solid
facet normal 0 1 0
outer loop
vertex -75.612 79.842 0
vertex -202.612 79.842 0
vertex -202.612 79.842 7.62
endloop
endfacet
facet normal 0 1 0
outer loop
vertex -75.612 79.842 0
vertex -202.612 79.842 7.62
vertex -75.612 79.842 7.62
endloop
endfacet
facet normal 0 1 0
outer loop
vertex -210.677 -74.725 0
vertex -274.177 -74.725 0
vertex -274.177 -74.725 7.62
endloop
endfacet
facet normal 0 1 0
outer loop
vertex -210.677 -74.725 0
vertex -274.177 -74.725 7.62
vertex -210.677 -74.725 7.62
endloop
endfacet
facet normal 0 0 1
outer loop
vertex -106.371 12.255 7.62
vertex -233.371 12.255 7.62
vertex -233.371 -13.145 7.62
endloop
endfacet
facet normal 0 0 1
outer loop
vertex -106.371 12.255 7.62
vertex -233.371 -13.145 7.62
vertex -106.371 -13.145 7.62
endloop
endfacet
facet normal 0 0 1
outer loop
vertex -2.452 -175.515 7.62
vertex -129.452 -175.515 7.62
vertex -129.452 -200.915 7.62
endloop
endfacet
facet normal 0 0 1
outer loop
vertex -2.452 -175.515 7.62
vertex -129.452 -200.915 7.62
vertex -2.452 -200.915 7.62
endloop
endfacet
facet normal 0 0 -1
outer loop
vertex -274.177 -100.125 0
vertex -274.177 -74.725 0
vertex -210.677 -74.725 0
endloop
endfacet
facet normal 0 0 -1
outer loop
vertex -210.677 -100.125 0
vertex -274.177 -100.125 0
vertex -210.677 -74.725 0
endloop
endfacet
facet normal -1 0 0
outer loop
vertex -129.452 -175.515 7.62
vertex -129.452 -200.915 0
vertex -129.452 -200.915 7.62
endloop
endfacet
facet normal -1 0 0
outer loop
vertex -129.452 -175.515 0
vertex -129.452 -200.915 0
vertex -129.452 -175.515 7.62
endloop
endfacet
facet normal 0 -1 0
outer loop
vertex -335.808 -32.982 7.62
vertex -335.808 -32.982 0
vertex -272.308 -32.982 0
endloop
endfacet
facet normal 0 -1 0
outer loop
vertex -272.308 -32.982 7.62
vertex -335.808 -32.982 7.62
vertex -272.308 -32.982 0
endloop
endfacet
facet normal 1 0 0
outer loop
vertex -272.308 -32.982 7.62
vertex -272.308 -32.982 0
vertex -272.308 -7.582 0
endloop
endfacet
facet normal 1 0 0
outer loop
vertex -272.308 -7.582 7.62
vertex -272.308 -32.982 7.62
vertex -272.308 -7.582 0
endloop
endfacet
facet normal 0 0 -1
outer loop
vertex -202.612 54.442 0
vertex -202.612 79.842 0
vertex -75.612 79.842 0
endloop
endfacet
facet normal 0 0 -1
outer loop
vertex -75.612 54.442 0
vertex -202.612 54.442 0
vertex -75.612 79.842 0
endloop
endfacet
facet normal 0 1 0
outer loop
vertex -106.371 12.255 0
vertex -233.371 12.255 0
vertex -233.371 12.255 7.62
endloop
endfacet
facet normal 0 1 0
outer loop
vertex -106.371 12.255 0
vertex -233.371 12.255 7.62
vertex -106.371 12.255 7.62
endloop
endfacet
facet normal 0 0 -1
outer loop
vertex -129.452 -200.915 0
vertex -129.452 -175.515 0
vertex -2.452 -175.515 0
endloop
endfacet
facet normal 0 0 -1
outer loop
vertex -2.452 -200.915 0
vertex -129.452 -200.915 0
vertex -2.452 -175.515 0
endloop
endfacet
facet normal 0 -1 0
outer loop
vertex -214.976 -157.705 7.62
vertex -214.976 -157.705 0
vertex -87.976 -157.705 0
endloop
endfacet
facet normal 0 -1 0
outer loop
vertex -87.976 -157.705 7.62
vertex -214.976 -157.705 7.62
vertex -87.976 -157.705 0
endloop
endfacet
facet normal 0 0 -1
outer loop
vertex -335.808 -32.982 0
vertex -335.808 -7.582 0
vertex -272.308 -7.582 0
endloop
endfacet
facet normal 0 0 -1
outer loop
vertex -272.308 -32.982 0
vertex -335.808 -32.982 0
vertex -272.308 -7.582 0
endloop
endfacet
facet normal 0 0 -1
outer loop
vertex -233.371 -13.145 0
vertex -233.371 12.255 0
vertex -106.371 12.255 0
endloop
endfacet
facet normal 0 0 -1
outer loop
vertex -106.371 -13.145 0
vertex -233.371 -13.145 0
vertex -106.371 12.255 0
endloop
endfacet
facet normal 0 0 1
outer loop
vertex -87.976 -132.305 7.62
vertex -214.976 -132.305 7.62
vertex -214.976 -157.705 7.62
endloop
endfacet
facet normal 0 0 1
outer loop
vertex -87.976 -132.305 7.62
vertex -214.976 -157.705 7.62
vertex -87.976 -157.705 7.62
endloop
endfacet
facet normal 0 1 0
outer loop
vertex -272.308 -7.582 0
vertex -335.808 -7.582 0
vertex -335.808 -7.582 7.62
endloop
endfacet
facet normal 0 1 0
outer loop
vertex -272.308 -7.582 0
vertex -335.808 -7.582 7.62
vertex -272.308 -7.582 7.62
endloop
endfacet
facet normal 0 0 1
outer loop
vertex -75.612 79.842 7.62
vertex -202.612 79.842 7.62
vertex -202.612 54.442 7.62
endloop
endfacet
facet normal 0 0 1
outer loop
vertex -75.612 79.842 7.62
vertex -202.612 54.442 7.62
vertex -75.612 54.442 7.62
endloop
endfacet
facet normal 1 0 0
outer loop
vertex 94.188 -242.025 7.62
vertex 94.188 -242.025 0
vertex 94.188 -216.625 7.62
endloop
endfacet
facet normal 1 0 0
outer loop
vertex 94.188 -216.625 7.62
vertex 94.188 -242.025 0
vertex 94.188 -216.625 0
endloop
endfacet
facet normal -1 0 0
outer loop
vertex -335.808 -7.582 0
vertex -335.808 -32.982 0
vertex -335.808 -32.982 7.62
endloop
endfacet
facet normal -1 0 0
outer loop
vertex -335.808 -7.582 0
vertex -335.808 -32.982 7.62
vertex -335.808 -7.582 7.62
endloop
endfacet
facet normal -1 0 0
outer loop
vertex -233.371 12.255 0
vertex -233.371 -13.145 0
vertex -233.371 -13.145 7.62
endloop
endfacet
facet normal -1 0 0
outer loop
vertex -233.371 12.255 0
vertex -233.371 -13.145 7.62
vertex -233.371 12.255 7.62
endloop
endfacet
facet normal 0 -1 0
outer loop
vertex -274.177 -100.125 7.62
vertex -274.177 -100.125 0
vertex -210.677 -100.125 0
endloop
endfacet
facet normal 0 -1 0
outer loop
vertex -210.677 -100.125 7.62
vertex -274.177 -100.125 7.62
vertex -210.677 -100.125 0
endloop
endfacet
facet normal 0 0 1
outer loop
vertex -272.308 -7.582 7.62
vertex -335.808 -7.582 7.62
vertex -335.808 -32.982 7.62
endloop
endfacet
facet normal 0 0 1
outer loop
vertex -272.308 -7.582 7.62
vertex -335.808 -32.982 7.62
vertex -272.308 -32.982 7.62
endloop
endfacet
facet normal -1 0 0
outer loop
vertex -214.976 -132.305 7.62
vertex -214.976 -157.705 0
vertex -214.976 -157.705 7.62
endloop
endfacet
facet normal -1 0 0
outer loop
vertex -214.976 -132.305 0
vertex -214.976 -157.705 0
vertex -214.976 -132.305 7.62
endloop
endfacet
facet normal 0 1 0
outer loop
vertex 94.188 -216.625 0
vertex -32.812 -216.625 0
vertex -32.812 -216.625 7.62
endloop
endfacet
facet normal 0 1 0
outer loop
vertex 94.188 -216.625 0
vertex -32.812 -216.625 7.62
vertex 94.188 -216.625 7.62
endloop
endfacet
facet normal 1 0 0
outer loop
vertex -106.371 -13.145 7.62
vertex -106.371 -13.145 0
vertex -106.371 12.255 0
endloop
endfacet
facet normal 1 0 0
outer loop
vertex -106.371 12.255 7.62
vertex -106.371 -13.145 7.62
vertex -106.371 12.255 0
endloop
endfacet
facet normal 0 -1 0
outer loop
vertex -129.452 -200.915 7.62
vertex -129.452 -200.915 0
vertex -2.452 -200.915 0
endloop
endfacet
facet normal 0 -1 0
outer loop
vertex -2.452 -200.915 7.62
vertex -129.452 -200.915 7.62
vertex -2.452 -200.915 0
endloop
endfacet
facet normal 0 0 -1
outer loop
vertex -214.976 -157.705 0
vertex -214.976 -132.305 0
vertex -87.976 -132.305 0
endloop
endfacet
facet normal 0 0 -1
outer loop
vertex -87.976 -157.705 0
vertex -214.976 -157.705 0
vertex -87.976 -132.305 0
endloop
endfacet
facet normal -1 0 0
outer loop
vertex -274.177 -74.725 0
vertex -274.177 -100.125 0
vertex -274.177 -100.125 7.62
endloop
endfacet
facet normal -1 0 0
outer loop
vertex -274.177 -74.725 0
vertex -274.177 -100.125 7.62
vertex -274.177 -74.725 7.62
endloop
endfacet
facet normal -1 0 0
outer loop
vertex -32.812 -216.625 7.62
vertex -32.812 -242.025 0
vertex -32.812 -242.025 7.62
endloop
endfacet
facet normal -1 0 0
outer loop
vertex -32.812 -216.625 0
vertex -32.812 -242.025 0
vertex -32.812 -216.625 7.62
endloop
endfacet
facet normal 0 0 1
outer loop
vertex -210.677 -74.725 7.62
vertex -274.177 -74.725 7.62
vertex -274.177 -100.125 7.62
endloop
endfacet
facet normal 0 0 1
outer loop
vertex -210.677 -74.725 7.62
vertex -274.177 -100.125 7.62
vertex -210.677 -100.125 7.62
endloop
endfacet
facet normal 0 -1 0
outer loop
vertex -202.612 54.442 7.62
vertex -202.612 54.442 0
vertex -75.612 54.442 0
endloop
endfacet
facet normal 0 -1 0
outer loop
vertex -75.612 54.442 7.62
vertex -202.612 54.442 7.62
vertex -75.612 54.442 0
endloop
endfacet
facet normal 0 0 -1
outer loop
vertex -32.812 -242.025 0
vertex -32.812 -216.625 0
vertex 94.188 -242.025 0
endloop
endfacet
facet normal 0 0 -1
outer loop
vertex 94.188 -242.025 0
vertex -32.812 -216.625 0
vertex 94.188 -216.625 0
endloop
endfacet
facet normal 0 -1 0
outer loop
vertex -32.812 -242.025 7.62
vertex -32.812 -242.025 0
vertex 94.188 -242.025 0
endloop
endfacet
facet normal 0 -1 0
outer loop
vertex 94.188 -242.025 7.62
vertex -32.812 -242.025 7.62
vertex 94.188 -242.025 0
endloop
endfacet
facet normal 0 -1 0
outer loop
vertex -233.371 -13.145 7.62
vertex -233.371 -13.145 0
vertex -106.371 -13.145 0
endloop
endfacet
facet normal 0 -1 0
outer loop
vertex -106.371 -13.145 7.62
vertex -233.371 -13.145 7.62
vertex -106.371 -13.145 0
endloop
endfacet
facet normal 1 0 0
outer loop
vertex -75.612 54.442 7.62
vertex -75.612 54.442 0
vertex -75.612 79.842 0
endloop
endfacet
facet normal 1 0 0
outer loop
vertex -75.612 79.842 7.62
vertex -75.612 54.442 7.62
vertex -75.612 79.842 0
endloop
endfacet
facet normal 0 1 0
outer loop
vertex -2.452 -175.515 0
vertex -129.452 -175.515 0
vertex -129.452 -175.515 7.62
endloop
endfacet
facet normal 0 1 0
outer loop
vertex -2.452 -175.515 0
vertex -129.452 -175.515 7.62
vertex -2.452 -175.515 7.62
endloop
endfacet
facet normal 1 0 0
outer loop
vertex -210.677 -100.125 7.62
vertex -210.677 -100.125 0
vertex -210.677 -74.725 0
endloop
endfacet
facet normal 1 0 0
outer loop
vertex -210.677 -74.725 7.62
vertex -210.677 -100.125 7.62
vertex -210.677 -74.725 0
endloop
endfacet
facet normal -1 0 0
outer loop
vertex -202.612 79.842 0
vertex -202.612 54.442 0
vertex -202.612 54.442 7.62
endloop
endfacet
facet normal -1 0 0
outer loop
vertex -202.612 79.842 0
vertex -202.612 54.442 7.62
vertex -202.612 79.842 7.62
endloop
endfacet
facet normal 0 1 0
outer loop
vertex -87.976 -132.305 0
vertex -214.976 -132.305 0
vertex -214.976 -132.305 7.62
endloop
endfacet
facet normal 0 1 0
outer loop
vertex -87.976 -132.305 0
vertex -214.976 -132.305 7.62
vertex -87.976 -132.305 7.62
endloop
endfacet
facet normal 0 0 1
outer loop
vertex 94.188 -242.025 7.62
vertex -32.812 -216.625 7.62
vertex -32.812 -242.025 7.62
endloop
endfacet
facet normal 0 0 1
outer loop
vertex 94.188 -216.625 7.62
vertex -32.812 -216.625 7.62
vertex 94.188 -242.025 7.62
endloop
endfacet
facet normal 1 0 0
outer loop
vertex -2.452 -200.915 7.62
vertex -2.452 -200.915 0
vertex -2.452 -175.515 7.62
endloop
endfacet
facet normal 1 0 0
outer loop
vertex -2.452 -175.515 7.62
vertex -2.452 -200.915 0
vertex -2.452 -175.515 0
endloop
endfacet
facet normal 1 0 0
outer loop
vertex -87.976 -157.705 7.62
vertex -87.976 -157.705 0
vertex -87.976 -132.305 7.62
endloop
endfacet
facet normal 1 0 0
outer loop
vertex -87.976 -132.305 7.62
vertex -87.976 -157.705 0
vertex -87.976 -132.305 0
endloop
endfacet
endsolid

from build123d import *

# Parameters (mm, degrees)
F0_W     = 127
F0_H     = 25.4
F1_W     = 127
F1_H     = 25.4
F2_DEPTH = 7.62
F3_W     = 63.5
F3_H     = 25.4
F4_DEPTH = 7.62
F5_W     = 127
F5_H     = 25.4
F6_DEPTH = 7.62
F7_W     = 63.5
F7_H     = 25.4
F8_DEPTH = 7.62


with BuildPart() as f2:
    # F0 (on Top) + F1 (on Top) → F2 (new body)
    with BuildSketch(Plane.XY):
        with Locations((-151.475747, -145.004831)):
            Rectangle(F0_W, F0_H)
    with BuildSketch(Plane.XY):
        with Locations((-65.952227, -188.215315)):
            Rectangle(F1_W, F1_H)
        with Locations((30.688483, -229.324982)):
            Rectangle(F1_W, F1_H)
    extrude(amount=F2_DEPTH)


with BuildPart() as f4:
    # F3 (on Top) → F4 (new body)
    with BuildSketch(Plane.XY):
        with Locations((-242.427087, -87.424994)):
            Rectangle(F3_W, F3_H)
    extrude(amount=F4_DEPTH)


with BuildPart() as f6:
    # F5 (on Top) → F6 (new body)
    with BuildSketch(Plane.XY):
        with Locations((-139.111855, 67.142196)):
            Rectangle(F5_W, F5_H)
        with Locations((-169.871422, -0.444686)):
            Rectangle(F5_W, F5_H)
    extrude(amount=F6_DEPTH)


with BuildPart() as f8:
    # F7 (on Top) → F8 (new body)
    with BuildSketch(Plane.XY):
        with Locations((-304.058258, -20.281831)):
            Rectangle(F7_W, F7_H)
    extrude(amount=F8_DEPTH)


solid = Compound([f2.part, f4.part, f6.part, f8.part])
